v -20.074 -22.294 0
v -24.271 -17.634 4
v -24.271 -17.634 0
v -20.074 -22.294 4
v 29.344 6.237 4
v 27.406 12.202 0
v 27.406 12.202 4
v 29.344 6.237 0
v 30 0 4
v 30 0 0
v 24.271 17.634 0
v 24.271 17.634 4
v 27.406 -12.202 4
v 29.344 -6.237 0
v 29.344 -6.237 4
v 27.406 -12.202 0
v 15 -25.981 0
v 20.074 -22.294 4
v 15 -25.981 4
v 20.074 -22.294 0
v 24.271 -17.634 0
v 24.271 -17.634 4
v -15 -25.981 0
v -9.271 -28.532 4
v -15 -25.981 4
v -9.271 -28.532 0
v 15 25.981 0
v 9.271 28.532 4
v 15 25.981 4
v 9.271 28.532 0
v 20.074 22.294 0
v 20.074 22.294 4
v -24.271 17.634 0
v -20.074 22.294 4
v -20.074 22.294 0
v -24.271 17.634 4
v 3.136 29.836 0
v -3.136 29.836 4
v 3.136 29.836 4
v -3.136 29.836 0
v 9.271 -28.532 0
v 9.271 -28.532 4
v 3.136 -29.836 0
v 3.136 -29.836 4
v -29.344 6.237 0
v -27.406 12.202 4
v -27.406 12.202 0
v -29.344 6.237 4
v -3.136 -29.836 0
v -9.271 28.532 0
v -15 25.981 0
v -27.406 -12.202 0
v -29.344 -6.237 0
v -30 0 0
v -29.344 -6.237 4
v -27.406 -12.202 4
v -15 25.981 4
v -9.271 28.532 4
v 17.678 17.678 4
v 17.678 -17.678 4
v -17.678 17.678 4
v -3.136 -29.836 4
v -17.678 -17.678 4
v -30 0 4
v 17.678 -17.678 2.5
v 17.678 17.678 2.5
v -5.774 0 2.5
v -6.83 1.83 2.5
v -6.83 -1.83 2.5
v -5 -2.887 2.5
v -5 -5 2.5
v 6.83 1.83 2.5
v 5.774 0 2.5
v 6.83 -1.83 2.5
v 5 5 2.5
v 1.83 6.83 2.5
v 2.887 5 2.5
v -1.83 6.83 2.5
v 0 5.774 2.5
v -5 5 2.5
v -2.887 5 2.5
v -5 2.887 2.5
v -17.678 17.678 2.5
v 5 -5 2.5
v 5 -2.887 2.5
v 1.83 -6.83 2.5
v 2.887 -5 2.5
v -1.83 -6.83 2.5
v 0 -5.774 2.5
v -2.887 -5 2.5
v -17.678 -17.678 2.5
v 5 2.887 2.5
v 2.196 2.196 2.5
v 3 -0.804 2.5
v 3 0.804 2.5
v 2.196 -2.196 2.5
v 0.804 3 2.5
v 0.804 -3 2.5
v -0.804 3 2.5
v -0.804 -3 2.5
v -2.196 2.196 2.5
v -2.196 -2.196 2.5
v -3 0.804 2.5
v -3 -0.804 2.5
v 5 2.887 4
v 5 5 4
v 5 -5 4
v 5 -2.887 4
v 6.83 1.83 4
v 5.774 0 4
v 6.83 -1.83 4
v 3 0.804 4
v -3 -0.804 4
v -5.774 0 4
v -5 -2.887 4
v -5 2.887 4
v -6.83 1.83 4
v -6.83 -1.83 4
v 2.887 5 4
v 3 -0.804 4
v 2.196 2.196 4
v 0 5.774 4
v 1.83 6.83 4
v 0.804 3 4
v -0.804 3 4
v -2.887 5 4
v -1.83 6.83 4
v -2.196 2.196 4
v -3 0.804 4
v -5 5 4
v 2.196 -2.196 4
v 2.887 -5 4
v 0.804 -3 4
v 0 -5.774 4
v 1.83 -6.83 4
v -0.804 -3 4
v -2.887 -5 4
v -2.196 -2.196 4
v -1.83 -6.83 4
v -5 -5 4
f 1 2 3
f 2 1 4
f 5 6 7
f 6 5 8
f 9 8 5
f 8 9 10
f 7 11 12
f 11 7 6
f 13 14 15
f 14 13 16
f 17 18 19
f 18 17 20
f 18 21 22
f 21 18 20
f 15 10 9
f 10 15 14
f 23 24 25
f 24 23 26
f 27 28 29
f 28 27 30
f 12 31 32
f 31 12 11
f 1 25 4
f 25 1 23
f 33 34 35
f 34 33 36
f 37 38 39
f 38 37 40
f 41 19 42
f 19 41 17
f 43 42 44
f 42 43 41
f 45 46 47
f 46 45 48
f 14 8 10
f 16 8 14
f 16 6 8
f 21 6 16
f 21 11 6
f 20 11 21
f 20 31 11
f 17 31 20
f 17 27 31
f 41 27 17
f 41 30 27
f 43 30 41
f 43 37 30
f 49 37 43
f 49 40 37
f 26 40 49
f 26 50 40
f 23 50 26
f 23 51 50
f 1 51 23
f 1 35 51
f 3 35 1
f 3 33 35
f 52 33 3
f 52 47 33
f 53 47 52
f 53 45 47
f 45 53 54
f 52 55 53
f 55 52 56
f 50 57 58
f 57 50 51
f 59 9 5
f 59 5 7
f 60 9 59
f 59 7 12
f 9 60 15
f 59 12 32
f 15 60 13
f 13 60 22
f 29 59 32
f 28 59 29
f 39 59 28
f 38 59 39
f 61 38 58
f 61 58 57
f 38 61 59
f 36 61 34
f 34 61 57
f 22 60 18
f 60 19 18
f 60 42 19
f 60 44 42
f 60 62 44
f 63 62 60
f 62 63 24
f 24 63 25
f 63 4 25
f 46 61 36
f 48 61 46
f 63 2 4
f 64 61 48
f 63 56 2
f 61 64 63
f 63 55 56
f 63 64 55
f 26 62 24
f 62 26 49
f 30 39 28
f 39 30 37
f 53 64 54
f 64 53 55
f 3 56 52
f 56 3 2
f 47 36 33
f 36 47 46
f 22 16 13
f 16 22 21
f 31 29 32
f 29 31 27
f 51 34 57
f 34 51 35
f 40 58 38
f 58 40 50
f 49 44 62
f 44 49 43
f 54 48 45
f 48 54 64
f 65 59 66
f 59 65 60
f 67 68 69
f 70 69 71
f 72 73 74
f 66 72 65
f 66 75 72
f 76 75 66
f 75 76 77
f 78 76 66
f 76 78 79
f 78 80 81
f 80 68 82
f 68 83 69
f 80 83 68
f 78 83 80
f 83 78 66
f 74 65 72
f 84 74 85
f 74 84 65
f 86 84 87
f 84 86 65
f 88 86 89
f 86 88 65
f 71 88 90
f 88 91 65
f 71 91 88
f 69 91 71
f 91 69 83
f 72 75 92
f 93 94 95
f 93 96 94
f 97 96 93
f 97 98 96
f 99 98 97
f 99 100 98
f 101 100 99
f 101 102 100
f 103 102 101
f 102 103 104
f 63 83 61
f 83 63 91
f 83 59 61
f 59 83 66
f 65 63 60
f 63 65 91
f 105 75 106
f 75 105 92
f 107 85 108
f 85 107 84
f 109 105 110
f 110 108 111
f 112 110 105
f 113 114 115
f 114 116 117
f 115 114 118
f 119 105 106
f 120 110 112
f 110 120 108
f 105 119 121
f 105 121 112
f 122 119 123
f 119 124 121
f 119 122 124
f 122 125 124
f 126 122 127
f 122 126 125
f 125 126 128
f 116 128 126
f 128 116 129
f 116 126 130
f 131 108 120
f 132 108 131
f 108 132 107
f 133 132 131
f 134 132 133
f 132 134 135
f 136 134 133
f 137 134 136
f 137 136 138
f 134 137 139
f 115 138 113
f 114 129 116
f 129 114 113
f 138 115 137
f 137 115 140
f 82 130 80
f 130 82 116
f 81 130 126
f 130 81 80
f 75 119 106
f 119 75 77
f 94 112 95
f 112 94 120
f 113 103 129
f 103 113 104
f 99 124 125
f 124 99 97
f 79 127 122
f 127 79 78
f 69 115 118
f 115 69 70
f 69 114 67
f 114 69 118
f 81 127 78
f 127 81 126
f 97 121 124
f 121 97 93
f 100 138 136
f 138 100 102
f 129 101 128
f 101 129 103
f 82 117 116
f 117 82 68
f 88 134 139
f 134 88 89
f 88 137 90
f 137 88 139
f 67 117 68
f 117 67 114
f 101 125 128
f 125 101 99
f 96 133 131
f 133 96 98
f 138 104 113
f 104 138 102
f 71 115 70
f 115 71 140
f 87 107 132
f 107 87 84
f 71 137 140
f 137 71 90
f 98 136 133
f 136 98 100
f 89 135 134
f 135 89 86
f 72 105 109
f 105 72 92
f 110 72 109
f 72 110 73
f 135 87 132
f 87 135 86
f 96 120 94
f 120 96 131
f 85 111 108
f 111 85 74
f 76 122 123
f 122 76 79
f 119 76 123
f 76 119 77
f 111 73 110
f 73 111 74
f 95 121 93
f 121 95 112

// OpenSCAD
// file: ../src/symbol.scad
//Данный модуль строит 3д символ компании (image/symbol.png) 
module symbol(x,y,z) {
    symbol_file = "../image/symbol.png";
    symbol_x = 100;
    symbol_y = 100;
    
    scale([1/symbol_x*x,1/symbol_y*y,1/100*z])
    translate([0,0,100])
    surface(file=symbol_file, invert=true,center=true);
}

//Демонстрационный код.
//symbol(40,40,10);
// file: ../src/rim.scad
module rim(er, ir, h) {
    difference() {
        cylinder(r=er, h=h);
        cylinder(r=ir, h=h);
    }
}

//Круговая база с ободком.
module based_rim(er, ir, h, bh) {
    union() {
        cylinder(r=er, h=bh);
        translate([0,0,bh]) rim(er,ir,h-bh);
    }
}


//Демонстрационный код.
//based_rim(30, 25, 8, 3);
// file: ../src/ear.scad
//Угловатое квадратное ухо.
//"w" - толщина уха
module sqr_ear(y,x,w,h) {
    translate([-y/2,0,0])
    difference() {
        cube([y,x,h]);
        translate([w,0,0]) cube([y-w*2,x-w,h]);
    }
}

//Ухо со сглаженными углами.
//"y" - должен быть больше чем "x".
//"w" - толщина уха
module slc_ear(y,x,w,h){
    rotate([0,0,90])
    translate([0,-y/2,0])
    linear_extrude(height=h)
    polygon([
    [0,0],
    [x/2,0],
    [x,x/2],
    [x,y-x/2],
    [x/2,y],
    [0,y],
    [0,y - w],
    [x/2 - w * sin(45/2),y - w],
    [x - w * sin(45/2*3),y -x/2 - w * cos(45/2*3)],
    [x - w * sin(45/2*3),x/2 + w * cos(45/2*3)],
    [x/2 - w * sin(45/2),w],
    [0,w],
    ]);       
}

//Ухо в виде ободка.
module rim_ears(er,ir,iir,w,h,n) {
    union() {
        difference() {
            cylinder(r=er, h=h);
            cylinder(r=ir, h=h);
        }
        difference() {
            for(fi = [0 : 360/n : 359]) 
            rotate([0,0,fi])
            translate([0,-w/2,0])cube([ir,w,h]);
            cylinder(r=iir,h=h);
        }
    }
}

module radiused(offset,radius) {
    ystate = sqrt(radius*radius - offset*offset);
    translate([0,ystate,0]) children(0);
}

//Демонстрационный код:
//  Массив sqr_ear.
/*for(fi = [0 : 60 : 359]) 
    rotate([0,0,fi])
    radiused(10,30) sqr_ear(10,6,2,3);*/

//  Массив slc_ear.
/*for(fi = [0 : 60 : 359]) 
    rotate([0,0,fi])
    radiused(10,30) slc_ear(10,6,2,3);*/

//  Круговое ухо (rim_ears).
//rim_ears(40,35,30,4,3,3);
// main file
include<../src/ear.scad>
include<../src/rim.scad>
include<../src/symbol.scad>

extRad=30;                  //Внешний радиус
intRad=25;                  //Внутренний радиус обода
rimHeight = 4;              //Высота обода (отсчитывается от базы).
baseHeight = 4;             //Высота базы.
symbSize = intRad*sqrt(2);  //Размер стороны внутреннего квадрата.
symbLevel = 2.5;            //Уровень квадрата.
symbHeight = 5;             //Высота символа.
earsTotal = 6;              //Количество ушей.

union() {
    union() {
        difference(){
            union() {
                translate([0,0,baseHeight])
                    rim(externalRadius=extRad,internalRadius=intRad,height=rimHeight);
                cylinder(r=extRad,h=baseHeight);
            }
        
            translate([-symbSize/2,-symbSize/2,symbLevel])
                cube([symbSize,symbSize,rimHeight]);
        }
        translate([0,0,symbLevel])
            symbol(symbSize,symbSize,symbHeight);
    }

    for(fi = [0 : 360/ earsTotal : 359])
       rotate([0,0,fi])
            radiused(extRad,5)sqr_ear(10,5,2,baseHeight);
}
